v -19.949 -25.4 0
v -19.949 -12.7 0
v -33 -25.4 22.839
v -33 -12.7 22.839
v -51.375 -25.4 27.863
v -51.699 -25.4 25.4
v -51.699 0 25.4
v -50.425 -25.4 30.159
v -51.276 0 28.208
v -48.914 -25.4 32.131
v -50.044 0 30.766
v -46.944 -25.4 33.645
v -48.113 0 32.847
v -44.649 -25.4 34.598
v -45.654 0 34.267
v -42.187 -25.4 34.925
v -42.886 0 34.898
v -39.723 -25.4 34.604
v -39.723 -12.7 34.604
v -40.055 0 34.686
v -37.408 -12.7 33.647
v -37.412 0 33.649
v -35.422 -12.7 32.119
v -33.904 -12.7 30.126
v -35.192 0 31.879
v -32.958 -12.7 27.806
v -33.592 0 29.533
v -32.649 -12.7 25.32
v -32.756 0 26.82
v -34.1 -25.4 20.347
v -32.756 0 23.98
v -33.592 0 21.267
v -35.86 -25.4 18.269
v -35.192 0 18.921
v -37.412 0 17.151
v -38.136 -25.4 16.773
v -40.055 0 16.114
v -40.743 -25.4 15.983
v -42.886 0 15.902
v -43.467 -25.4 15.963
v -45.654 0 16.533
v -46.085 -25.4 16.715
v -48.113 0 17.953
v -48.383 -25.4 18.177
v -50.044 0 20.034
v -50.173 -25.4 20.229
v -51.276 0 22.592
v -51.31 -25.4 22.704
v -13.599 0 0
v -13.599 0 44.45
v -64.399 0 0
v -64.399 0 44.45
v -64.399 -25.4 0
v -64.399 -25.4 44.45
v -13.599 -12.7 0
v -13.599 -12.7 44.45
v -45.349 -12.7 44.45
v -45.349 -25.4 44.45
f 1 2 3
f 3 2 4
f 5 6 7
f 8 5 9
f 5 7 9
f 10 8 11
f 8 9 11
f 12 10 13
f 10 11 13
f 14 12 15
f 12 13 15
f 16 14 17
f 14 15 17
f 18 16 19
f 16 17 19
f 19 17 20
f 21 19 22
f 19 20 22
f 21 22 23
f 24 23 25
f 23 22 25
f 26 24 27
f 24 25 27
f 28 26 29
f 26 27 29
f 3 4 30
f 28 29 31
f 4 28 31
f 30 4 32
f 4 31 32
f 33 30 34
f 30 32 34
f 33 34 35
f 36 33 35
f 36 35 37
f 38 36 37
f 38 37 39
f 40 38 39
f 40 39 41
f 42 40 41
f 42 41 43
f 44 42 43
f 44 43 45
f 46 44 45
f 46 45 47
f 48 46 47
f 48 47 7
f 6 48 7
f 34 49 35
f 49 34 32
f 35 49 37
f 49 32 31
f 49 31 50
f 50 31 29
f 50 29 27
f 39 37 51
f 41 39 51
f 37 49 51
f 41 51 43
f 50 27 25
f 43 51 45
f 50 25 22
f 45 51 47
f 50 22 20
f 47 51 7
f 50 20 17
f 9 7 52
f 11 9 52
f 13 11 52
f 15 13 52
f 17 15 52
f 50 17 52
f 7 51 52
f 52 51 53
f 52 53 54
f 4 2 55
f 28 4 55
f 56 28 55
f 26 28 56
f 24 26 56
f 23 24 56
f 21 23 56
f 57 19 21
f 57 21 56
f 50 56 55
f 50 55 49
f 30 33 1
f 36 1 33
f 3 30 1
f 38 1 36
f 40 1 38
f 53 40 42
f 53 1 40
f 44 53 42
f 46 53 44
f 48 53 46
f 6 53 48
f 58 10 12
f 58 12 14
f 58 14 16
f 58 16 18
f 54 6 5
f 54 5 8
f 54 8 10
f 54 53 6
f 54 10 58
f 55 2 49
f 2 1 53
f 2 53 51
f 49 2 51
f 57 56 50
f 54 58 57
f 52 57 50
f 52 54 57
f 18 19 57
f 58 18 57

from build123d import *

# Parameters (mm, degrees)
F0_W     = 19.05
F0_H     = 44.45
F1_DEPTH = 25.4
F2_W     = 12.7
F2_H     = 44.45
F3_DEPTH = 25.4
F5_DEPTH = 25.4
F6_W     = 12.7
F6_H     = 44.45
F7_DEPTH = 31.75
F8_R     = 9.525
F9_DEPTH = 25.4


with BuildPart() as f1:
    # F0 (on Front) → F1 (new body)
    with BuildSketch(Plane.XZ):
        with Locations((-54.87412, 22.225)):
            Rectangle(F0_W, F0_H)
    extrude(amount=F1_DEPTH)

    # F2 (on face) → F3 (join)
    with BuildSketch(Plane.YZ.offset(-45.34912)):
        with Locations((-19.05, 22.225)):
            Rectangle(F2_W, F2_H)
    extrude(amount=F3_DEPTH)

    # F4 (on face) → F5 (cut)
    with BuildSketch(Plane(origin=(0, -12.7, 0), x_dir=(-1, 0, 0), z_dir=(0, 1, 0))):
        Polygon((19.94912, 0), (45.34912, 44.45), (19.94912, 44.45), align=None)
    extrude(amount=-F5_DEPTH, mode=Mode.SUBTRACT)

    # F6 (on face) → F7 (join)
    with BuildSketch(Plane.YZ.offset(-45.34912)):
        with Locations((-6.35, 22.225)):
            Rectangle(F6_W, F6_H)
    extrude(amount=F7_DEPTH)

    # F8 (on face) → F9 (cut)
    with BuildSketch(Plane(origin=(0, 0, 0), x_dir=(-1, 0, 0), z_dir=(0, 1, 0))):
        with Locations((42.17412, 25.4)):
            Circle(F8_R)
    extrude(amount=-F9_DEPTH, mode=Mode.SUBTRACT)


solid = f1.part
